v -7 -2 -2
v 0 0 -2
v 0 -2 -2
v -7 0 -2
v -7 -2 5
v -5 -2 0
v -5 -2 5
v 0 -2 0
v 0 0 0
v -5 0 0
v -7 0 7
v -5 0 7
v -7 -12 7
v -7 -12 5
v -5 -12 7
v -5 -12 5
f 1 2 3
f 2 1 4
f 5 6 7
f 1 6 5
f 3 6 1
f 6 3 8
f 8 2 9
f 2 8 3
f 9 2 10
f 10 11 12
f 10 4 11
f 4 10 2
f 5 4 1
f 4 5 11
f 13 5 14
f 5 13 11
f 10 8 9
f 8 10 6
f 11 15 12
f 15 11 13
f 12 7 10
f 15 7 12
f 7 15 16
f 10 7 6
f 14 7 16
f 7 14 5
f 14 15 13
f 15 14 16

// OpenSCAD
$fn=5;
union()
{
	hull()
	{
		translate([-2,-2,-2])
		{
			rotate(0,[0,0,1])
			{
				cube([2,2,2]);
			}
		}
		translate([-7,-2,-2])
		{
			rotate(0,[0,0,1])
			{
				cube([2,2,2]);
			}
		}
	}
	hull()
	{
		translate([-7,-2,-2])
		{
			rotate(0,[0,0,1])
			{
				cube([2,2,2]);
			}
		}
		translate([-7,-2,5])
		{
			rotate(0,[0,0,1])
			{
				cube([2,2,2]);
			}
		}
	}
	hull()
	{
		translate([-7,-2,5])
		{
			rotate(0,[0,0,1])
			{
				cube([2,2,2]);
			}
		}
		translate([-7,-12,5])
		{
			rotate(0,[0,0,1])
			{
				cube([2,2,2]);
			}
		}
	}
}
